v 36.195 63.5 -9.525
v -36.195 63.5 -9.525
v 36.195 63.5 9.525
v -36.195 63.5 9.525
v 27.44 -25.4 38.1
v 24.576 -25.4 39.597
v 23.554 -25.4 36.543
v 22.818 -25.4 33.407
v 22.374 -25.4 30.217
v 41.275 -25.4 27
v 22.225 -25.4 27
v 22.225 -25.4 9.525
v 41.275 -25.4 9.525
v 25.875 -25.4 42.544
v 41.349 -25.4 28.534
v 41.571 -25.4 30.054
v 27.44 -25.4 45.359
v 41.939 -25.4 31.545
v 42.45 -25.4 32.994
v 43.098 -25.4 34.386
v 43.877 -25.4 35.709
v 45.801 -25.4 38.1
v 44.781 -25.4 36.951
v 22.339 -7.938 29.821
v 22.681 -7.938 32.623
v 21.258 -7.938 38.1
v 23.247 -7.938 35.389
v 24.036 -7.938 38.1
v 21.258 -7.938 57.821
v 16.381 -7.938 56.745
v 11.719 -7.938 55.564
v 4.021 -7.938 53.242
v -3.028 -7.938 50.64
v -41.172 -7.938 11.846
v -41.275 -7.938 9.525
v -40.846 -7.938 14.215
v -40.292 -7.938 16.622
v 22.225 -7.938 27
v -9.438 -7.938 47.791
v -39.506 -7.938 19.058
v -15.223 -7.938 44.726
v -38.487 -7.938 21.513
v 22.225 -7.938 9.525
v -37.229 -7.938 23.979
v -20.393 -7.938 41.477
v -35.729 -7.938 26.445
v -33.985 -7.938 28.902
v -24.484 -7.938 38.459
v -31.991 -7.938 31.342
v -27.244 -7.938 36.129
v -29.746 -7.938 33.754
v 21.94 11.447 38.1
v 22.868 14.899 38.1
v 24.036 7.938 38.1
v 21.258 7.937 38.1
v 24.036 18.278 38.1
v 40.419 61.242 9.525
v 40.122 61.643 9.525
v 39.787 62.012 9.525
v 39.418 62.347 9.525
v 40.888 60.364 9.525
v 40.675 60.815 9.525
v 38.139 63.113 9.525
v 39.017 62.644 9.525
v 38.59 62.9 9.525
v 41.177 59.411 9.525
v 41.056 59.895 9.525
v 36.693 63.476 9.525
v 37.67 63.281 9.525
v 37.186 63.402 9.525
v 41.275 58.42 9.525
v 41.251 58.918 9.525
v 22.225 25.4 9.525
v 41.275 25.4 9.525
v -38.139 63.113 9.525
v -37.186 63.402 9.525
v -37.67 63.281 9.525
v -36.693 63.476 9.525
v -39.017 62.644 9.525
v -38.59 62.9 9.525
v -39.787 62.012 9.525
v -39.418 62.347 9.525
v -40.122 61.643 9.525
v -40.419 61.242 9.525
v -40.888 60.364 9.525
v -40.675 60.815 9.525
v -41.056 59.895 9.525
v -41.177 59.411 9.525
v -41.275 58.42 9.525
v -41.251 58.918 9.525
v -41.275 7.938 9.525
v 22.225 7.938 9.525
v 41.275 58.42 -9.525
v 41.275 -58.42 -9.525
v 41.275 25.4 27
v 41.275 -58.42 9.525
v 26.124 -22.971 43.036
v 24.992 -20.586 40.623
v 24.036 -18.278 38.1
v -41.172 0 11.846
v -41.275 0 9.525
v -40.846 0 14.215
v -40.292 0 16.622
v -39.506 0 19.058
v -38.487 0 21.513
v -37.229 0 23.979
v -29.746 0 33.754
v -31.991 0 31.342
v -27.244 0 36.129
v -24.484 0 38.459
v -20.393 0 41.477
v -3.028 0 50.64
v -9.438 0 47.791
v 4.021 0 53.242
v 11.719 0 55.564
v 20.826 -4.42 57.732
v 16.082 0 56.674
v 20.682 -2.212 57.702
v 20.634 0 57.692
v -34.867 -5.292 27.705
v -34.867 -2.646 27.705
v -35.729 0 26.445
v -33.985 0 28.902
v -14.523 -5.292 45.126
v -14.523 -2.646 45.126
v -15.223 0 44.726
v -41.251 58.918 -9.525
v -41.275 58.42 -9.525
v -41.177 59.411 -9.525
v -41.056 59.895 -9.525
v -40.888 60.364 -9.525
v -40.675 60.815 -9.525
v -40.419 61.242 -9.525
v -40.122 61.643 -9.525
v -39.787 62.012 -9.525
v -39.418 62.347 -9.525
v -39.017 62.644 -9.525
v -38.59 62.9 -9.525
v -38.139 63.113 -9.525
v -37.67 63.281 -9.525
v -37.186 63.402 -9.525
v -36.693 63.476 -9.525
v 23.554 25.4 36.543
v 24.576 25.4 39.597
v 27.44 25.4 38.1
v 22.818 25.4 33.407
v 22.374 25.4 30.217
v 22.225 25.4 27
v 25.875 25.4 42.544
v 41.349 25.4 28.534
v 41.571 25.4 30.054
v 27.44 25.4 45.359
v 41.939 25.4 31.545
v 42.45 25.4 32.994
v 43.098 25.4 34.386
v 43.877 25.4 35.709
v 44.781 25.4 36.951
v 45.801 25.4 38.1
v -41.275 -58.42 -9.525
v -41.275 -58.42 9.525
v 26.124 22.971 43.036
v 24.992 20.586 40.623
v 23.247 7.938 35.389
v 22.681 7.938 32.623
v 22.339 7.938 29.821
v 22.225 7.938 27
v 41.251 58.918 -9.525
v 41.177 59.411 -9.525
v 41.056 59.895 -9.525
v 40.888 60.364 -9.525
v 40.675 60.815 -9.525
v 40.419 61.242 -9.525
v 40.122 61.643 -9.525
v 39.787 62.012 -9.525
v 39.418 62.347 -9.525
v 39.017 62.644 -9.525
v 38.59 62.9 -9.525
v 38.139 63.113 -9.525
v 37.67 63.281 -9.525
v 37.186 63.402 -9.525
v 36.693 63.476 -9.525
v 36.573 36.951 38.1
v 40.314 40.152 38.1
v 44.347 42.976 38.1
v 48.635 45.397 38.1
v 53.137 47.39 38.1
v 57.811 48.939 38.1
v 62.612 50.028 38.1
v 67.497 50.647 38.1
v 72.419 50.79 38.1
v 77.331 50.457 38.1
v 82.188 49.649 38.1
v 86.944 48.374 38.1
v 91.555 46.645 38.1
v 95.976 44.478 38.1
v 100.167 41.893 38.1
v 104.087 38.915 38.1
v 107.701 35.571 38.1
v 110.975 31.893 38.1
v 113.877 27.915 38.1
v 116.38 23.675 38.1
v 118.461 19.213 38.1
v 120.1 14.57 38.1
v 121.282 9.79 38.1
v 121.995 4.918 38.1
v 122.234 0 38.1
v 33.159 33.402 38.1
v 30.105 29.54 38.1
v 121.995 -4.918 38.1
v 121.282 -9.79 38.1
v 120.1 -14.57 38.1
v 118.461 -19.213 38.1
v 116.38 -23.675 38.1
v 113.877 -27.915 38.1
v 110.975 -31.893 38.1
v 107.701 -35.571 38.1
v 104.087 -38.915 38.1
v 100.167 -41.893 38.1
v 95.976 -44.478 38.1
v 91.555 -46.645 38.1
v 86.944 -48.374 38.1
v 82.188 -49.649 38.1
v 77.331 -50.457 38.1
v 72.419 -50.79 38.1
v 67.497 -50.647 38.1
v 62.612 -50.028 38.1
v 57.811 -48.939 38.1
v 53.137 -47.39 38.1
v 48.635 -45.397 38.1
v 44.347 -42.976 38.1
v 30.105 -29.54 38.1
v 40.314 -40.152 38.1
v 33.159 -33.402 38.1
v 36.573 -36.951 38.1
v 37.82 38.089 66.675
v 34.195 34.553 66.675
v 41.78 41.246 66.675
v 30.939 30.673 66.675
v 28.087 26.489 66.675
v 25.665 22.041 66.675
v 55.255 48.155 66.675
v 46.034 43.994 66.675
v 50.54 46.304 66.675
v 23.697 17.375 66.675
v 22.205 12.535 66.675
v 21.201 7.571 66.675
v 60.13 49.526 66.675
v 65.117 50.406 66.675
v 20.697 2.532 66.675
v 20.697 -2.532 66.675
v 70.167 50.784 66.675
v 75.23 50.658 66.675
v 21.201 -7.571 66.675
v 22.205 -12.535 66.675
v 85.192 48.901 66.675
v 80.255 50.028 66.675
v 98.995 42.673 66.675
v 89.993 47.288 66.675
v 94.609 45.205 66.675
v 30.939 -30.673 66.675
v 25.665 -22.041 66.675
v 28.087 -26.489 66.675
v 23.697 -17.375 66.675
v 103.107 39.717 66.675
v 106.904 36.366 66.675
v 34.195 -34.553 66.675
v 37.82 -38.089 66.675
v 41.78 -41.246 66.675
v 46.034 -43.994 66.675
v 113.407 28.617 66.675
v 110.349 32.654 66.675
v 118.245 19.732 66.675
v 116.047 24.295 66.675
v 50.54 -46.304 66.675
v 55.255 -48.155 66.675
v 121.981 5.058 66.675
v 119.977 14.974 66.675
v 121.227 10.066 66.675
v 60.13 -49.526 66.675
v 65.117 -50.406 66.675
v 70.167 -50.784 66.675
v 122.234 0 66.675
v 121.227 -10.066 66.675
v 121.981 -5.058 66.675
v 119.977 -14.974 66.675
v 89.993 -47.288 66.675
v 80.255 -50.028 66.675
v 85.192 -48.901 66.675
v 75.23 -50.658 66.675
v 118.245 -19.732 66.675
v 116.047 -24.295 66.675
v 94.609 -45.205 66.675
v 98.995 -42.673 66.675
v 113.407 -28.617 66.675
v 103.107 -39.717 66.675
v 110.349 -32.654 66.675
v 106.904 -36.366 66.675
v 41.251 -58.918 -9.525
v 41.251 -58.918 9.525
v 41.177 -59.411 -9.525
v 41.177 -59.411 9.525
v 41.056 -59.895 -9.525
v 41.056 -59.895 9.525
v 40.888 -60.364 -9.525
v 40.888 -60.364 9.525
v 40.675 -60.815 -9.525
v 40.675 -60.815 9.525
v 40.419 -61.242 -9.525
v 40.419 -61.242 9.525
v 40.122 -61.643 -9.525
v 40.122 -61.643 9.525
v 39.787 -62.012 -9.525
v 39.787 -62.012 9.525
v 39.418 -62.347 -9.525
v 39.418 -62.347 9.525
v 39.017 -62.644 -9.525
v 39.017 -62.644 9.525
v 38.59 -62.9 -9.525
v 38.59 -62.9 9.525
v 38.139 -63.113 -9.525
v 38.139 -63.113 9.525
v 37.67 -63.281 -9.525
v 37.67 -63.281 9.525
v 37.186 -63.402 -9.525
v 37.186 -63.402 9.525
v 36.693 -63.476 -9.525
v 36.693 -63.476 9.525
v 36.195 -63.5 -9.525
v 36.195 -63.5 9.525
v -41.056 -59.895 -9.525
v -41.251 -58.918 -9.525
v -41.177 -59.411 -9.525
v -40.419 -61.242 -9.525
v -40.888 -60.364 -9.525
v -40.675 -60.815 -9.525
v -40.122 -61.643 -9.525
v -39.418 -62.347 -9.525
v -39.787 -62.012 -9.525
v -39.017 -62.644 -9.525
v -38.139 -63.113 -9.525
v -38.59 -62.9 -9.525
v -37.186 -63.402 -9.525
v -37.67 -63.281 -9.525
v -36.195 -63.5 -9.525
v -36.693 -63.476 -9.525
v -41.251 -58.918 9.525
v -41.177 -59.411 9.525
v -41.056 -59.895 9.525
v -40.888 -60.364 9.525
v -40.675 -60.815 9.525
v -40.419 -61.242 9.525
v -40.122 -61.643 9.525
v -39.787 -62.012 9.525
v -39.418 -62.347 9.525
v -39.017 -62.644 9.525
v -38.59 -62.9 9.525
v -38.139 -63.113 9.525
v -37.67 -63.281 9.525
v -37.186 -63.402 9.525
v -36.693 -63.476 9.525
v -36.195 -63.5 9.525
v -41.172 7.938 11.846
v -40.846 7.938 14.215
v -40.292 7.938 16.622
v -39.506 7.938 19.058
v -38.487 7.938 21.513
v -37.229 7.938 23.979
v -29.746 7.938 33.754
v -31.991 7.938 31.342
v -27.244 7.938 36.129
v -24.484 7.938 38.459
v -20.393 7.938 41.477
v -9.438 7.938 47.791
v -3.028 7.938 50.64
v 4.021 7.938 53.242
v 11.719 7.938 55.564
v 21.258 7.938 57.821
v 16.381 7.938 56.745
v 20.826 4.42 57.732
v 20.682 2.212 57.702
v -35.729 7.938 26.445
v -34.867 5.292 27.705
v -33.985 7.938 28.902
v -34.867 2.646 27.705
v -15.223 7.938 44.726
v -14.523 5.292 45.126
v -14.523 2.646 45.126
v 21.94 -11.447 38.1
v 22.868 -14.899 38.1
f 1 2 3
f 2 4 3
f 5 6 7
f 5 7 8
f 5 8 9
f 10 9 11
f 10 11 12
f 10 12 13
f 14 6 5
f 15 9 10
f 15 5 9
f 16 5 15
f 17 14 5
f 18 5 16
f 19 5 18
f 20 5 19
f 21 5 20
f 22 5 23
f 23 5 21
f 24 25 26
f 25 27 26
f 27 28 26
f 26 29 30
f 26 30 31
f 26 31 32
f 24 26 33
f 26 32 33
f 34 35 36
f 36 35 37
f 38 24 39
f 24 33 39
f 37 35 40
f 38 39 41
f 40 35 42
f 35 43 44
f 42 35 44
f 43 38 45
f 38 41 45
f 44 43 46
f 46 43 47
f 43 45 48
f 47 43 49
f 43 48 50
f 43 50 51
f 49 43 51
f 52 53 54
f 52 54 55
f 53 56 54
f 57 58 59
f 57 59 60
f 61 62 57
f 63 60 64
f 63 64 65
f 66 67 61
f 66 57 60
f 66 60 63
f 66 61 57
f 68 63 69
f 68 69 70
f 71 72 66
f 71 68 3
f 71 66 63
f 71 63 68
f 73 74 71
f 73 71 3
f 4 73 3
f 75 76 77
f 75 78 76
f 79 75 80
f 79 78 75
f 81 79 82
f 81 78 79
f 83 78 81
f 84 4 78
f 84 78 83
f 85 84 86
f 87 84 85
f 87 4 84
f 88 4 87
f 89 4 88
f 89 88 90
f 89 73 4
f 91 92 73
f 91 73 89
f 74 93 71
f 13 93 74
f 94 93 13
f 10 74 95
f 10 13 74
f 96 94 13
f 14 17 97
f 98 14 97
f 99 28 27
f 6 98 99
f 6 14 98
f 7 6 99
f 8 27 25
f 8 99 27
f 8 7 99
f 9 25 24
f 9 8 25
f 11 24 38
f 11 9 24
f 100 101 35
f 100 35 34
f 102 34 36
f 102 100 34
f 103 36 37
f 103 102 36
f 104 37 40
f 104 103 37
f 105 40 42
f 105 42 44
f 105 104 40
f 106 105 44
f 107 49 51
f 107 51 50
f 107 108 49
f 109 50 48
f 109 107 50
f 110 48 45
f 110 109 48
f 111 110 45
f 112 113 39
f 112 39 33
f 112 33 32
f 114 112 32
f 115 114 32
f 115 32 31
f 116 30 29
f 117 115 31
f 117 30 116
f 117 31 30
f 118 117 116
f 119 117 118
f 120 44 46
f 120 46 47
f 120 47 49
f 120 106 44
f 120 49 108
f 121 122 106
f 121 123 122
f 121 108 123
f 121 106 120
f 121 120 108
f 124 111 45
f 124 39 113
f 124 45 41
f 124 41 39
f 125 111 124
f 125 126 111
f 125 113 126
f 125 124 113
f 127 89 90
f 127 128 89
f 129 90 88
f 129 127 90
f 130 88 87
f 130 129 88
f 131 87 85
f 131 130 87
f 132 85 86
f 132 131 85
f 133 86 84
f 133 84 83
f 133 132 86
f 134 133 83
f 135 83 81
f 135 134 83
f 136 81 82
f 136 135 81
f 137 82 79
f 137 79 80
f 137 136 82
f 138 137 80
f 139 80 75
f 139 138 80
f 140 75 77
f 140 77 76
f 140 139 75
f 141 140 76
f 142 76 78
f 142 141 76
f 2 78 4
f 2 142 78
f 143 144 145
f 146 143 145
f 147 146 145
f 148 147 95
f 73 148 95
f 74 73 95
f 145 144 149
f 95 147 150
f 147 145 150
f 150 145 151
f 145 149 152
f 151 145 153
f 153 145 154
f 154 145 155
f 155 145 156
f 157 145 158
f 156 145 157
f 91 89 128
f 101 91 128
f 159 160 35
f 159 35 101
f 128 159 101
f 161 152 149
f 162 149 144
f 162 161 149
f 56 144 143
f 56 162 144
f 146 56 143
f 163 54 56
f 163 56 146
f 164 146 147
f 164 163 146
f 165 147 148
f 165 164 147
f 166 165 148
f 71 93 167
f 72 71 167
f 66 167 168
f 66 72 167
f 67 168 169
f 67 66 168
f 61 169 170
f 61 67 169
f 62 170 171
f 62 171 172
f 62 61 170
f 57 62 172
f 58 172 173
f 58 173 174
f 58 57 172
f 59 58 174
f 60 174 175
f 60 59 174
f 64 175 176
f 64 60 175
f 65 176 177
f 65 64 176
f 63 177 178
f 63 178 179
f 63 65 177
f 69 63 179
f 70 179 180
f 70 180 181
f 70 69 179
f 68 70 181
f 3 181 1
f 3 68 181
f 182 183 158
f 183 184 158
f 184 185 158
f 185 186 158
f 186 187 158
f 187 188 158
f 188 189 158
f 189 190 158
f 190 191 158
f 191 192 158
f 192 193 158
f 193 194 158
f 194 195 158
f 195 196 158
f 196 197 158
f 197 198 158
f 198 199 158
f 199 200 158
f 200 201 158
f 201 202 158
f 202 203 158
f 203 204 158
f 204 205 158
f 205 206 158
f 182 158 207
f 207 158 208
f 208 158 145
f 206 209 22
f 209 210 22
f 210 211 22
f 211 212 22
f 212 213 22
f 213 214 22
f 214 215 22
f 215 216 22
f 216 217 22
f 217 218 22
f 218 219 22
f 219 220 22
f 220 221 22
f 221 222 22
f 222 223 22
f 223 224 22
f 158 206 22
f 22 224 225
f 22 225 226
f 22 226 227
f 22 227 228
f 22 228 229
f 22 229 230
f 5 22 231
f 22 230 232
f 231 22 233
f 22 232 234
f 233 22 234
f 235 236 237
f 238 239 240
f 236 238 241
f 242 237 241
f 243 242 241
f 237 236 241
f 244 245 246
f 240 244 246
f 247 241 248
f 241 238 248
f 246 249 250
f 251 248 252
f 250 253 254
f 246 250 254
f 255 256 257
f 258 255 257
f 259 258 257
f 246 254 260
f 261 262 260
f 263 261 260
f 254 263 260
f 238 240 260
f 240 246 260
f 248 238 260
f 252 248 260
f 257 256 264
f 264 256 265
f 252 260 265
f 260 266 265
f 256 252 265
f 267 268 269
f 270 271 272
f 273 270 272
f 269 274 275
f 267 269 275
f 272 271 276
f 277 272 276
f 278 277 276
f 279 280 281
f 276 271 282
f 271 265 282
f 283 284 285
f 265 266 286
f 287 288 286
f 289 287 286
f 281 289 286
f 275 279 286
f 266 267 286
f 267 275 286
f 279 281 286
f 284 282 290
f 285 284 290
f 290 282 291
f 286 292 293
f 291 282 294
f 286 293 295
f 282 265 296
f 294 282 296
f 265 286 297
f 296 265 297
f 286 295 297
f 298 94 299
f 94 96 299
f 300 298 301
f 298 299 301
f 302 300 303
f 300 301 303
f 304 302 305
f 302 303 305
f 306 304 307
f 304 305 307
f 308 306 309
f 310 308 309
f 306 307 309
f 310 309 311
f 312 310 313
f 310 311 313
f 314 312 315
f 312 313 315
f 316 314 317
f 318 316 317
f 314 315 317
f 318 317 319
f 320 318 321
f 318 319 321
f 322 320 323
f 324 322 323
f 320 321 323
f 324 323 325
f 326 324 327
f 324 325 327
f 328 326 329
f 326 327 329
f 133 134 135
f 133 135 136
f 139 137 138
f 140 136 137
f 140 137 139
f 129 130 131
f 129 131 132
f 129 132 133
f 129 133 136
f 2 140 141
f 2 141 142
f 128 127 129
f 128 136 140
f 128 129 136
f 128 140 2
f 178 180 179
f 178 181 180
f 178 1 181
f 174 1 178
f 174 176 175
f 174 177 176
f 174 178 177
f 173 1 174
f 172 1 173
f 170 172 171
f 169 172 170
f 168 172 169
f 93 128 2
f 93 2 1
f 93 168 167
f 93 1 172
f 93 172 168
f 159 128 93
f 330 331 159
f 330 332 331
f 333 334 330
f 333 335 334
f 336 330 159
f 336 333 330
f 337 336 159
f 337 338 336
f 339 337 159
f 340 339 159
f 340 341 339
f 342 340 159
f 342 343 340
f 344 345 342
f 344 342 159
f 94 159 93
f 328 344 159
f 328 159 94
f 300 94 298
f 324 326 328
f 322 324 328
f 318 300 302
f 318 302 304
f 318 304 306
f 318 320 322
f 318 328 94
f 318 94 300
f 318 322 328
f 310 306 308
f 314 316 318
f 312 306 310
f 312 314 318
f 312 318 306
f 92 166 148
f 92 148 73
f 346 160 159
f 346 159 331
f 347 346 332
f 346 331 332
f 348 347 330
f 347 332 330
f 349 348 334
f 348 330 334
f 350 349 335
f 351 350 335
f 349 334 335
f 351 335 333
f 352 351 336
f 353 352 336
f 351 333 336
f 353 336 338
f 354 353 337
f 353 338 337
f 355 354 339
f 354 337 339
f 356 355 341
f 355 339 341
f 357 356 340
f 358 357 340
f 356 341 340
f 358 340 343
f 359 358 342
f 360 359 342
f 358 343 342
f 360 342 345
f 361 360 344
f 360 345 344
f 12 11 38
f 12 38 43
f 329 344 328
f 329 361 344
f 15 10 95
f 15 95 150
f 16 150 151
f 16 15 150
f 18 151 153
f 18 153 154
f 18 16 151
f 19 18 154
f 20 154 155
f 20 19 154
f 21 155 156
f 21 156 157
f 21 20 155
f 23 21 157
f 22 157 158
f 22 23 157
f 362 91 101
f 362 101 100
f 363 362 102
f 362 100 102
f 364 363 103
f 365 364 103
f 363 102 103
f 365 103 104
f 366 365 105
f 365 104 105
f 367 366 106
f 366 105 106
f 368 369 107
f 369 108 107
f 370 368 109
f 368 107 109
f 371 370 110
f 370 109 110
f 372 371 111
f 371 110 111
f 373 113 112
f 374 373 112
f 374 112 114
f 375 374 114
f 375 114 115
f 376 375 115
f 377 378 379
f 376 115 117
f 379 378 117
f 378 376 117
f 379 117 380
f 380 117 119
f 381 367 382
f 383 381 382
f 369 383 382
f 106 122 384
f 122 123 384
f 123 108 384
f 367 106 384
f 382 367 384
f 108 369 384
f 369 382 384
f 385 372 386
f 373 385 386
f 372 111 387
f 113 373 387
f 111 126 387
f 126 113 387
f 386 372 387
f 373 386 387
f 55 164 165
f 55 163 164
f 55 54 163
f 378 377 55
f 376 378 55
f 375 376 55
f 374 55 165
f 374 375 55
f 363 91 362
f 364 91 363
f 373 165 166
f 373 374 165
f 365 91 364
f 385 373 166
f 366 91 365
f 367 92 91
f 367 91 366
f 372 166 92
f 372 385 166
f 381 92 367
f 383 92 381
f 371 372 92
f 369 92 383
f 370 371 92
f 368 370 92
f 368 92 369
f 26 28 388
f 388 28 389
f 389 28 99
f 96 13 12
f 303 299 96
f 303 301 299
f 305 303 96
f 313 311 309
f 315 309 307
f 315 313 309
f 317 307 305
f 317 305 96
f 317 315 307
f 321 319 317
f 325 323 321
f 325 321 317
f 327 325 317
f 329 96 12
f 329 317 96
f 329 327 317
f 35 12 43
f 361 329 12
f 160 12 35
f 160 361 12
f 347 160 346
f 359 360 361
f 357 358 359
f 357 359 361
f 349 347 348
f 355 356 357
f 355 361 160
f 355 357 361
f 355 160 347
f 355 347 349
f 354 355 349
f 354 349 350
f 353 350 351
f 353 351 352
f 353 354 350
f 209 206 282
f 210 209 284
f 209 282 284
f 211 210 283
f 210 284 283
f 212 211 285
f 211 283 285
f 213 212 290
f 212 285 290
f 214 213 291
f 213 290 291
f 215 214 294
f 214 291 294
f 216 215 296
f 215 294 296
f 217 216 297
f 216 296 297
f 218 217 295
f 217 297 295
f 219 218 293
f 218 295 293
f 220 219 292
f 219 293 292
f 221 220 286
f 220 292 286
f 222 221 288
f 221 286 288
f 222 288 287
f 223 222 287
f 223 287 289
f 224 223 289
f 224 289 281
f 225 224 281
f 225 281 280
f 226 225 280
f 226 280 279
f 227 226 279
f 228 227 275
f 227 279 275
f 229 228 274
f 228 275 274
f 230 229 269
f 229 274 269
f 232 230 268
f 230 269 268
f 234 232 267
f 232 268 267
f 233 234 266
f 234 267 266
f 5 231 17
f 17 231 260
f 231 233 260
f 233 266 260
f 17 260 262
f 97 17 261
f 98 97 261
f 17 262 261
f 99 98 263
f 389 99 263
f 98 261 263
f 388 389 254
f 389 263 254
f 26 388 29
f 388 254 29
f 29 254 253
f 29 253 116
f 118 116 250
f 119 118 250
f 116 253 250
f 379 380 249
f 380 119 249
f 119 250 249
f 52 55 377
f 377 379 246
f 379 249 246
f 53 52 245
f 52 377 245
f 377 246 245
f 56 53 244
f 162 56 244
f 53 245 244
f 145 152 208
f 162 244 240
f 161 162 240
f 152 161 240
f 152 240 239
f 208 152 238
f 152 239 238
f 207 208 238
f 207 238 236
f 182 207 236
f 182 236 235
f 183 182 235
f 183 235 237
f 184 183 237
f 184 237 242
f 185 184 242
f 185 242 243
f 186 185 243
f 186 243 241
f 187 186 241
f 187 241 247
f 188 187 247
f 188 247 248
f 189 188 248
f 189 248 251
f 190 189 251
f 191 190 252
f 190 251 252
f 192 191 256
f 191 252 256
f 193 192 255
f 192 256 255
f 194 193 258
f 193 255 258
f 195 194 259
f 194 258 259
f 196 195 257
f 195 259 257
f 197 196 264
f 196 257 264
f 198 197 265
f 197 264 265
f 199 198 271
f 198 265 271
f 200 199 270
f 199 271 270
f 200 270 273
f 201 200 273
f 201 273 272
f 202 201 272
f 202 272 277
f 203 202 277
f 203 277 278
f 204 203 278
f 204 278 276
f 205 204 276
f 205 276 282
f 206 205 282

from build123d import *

# Parameters (mm, degrees)
F1_DEPTH = 63.5
F2_DEPTH = 25.4
F3_DEPTH = 7.9375
F0_W     = 14.291249726
F0_H     = 4.7752
F0_H_2   = 4.7498
F0_H_3   = 19.05
F5_R     = 5.08


with BuildPart() as f1:
    # F0 (on Front) → F1 (new body, symmetric)
    with BuildSketch(Plane.XZ):
        Polygon((22.225, 9.525), (-41.275, 9.525), (-41.275, -9.525), (41.275, -9.525), (41.275, 9.525), align=None)
    extrude(amount=F1_DEPTH, both=True)

    # F0 (on Front) → F2 (join, symmetric)
    with BuildSketch(Plane.XZ):
        with BuildLine():
            Line((22.225, 27.0002), (22.225, 9.525))
            Line((22.225, 9.525), (41.275, 9.525))
            Line((41.275, 9.525), (41.275, 27.0002))
            ThreePointArc((41.275, 27.0002), (45.9246798487, 38.2255201513), (57.15, 42.8752))
            Line((57.15, 42.8752), (71.433750274, 42.8752))
            Line((71.433750274, 42.8752), (71.433750274, 61.9252))
            Line((71.433750274, 61.9252), (67.8752437234, 61.9252))
            Line((67.8752437234, 61.9252), (63.7876612968, 61.9252))
            add(Edge.make_bspline(
                [(52.4566688637, 61.6084109888), (56.1143116658, 61.7901051123), (59.8906472041, 61.8974539816), (63.7876612968, 61.9252)],
                knots=[112.7369449664, 112.7369449664, 112.7369449664, 112.7369449664, 118.9332301847, 118.9332301847, 118.9332301847, 118.9332301847], degree=3))
            ThreePointArc((52.4566688637, 61.6084109888), (30.8472414476, 49.9767210059), (22.225, 27.0002))
        make_face()
    extrude(amount=F2_DEPTH, both=True)

    # F0 (on Front) → F3 (join, symmetric)
    with BuildSketch(Plane.XZ):
        with BuildLine():
            add(Edge.make_bspline(
                [(-41.275, 9.525), (-41.3486110715, 30.3861799307), (-14.0915064954, 58.3026173271), (52.4566688637, 61.6084109888)],
                knots=[0, 0, 0, 0, 112.7369449664, 112.7369449664, 112.7369449664, 112.7369449664], degree=3))
            Line((-41.275, 9.525), (22.225, 9.525))
            Line((22.225, 9.525), (22.225, 27.0002))
            ThreePointArc((22.225, 27.0002), (30.8472414476, 49.9767210059), (52.4566688637, 61.6084109888))
        make_face()
    extrude(amount=F3_DEPTH, both=True)

    # F0 (on Front) → F4 (revolve)
    with BuildSketch(Plane.XZ):
        with Locations((78.579375137, 40.4876)):
            Rectangle(F0_W, F0_H)
        with Locations((78.579375137, 64.3001)):
            Rectangle(F0_W, F0_H_2)
        with Locations((78.579375137, 52.4002)):
            Rectangle(F0_W, F0_H_3)
        Polygon((85.725, 66.675), (85.725, 61.9252), (85.725, 42.8752), (85.725, 38.1), (122.233750274, 38.1), (122.233750274, 66.675), align=None)
    revolve(axis=Axis((71.433750274, 0, 52.3875), (0, 0, -1)))

    # F5
    f5_edges = [f1.edges().sort_by_distance(p)[0] for p in [
        (41.275, -63.5, 0),
        (-41.275, -63.5, 0),
        (41.275, 63.5, 0),
        (-41.275, 63.5, 0),
    ]]
    fillet(f5_edges, radius=F5_R)


solid = f1.part
